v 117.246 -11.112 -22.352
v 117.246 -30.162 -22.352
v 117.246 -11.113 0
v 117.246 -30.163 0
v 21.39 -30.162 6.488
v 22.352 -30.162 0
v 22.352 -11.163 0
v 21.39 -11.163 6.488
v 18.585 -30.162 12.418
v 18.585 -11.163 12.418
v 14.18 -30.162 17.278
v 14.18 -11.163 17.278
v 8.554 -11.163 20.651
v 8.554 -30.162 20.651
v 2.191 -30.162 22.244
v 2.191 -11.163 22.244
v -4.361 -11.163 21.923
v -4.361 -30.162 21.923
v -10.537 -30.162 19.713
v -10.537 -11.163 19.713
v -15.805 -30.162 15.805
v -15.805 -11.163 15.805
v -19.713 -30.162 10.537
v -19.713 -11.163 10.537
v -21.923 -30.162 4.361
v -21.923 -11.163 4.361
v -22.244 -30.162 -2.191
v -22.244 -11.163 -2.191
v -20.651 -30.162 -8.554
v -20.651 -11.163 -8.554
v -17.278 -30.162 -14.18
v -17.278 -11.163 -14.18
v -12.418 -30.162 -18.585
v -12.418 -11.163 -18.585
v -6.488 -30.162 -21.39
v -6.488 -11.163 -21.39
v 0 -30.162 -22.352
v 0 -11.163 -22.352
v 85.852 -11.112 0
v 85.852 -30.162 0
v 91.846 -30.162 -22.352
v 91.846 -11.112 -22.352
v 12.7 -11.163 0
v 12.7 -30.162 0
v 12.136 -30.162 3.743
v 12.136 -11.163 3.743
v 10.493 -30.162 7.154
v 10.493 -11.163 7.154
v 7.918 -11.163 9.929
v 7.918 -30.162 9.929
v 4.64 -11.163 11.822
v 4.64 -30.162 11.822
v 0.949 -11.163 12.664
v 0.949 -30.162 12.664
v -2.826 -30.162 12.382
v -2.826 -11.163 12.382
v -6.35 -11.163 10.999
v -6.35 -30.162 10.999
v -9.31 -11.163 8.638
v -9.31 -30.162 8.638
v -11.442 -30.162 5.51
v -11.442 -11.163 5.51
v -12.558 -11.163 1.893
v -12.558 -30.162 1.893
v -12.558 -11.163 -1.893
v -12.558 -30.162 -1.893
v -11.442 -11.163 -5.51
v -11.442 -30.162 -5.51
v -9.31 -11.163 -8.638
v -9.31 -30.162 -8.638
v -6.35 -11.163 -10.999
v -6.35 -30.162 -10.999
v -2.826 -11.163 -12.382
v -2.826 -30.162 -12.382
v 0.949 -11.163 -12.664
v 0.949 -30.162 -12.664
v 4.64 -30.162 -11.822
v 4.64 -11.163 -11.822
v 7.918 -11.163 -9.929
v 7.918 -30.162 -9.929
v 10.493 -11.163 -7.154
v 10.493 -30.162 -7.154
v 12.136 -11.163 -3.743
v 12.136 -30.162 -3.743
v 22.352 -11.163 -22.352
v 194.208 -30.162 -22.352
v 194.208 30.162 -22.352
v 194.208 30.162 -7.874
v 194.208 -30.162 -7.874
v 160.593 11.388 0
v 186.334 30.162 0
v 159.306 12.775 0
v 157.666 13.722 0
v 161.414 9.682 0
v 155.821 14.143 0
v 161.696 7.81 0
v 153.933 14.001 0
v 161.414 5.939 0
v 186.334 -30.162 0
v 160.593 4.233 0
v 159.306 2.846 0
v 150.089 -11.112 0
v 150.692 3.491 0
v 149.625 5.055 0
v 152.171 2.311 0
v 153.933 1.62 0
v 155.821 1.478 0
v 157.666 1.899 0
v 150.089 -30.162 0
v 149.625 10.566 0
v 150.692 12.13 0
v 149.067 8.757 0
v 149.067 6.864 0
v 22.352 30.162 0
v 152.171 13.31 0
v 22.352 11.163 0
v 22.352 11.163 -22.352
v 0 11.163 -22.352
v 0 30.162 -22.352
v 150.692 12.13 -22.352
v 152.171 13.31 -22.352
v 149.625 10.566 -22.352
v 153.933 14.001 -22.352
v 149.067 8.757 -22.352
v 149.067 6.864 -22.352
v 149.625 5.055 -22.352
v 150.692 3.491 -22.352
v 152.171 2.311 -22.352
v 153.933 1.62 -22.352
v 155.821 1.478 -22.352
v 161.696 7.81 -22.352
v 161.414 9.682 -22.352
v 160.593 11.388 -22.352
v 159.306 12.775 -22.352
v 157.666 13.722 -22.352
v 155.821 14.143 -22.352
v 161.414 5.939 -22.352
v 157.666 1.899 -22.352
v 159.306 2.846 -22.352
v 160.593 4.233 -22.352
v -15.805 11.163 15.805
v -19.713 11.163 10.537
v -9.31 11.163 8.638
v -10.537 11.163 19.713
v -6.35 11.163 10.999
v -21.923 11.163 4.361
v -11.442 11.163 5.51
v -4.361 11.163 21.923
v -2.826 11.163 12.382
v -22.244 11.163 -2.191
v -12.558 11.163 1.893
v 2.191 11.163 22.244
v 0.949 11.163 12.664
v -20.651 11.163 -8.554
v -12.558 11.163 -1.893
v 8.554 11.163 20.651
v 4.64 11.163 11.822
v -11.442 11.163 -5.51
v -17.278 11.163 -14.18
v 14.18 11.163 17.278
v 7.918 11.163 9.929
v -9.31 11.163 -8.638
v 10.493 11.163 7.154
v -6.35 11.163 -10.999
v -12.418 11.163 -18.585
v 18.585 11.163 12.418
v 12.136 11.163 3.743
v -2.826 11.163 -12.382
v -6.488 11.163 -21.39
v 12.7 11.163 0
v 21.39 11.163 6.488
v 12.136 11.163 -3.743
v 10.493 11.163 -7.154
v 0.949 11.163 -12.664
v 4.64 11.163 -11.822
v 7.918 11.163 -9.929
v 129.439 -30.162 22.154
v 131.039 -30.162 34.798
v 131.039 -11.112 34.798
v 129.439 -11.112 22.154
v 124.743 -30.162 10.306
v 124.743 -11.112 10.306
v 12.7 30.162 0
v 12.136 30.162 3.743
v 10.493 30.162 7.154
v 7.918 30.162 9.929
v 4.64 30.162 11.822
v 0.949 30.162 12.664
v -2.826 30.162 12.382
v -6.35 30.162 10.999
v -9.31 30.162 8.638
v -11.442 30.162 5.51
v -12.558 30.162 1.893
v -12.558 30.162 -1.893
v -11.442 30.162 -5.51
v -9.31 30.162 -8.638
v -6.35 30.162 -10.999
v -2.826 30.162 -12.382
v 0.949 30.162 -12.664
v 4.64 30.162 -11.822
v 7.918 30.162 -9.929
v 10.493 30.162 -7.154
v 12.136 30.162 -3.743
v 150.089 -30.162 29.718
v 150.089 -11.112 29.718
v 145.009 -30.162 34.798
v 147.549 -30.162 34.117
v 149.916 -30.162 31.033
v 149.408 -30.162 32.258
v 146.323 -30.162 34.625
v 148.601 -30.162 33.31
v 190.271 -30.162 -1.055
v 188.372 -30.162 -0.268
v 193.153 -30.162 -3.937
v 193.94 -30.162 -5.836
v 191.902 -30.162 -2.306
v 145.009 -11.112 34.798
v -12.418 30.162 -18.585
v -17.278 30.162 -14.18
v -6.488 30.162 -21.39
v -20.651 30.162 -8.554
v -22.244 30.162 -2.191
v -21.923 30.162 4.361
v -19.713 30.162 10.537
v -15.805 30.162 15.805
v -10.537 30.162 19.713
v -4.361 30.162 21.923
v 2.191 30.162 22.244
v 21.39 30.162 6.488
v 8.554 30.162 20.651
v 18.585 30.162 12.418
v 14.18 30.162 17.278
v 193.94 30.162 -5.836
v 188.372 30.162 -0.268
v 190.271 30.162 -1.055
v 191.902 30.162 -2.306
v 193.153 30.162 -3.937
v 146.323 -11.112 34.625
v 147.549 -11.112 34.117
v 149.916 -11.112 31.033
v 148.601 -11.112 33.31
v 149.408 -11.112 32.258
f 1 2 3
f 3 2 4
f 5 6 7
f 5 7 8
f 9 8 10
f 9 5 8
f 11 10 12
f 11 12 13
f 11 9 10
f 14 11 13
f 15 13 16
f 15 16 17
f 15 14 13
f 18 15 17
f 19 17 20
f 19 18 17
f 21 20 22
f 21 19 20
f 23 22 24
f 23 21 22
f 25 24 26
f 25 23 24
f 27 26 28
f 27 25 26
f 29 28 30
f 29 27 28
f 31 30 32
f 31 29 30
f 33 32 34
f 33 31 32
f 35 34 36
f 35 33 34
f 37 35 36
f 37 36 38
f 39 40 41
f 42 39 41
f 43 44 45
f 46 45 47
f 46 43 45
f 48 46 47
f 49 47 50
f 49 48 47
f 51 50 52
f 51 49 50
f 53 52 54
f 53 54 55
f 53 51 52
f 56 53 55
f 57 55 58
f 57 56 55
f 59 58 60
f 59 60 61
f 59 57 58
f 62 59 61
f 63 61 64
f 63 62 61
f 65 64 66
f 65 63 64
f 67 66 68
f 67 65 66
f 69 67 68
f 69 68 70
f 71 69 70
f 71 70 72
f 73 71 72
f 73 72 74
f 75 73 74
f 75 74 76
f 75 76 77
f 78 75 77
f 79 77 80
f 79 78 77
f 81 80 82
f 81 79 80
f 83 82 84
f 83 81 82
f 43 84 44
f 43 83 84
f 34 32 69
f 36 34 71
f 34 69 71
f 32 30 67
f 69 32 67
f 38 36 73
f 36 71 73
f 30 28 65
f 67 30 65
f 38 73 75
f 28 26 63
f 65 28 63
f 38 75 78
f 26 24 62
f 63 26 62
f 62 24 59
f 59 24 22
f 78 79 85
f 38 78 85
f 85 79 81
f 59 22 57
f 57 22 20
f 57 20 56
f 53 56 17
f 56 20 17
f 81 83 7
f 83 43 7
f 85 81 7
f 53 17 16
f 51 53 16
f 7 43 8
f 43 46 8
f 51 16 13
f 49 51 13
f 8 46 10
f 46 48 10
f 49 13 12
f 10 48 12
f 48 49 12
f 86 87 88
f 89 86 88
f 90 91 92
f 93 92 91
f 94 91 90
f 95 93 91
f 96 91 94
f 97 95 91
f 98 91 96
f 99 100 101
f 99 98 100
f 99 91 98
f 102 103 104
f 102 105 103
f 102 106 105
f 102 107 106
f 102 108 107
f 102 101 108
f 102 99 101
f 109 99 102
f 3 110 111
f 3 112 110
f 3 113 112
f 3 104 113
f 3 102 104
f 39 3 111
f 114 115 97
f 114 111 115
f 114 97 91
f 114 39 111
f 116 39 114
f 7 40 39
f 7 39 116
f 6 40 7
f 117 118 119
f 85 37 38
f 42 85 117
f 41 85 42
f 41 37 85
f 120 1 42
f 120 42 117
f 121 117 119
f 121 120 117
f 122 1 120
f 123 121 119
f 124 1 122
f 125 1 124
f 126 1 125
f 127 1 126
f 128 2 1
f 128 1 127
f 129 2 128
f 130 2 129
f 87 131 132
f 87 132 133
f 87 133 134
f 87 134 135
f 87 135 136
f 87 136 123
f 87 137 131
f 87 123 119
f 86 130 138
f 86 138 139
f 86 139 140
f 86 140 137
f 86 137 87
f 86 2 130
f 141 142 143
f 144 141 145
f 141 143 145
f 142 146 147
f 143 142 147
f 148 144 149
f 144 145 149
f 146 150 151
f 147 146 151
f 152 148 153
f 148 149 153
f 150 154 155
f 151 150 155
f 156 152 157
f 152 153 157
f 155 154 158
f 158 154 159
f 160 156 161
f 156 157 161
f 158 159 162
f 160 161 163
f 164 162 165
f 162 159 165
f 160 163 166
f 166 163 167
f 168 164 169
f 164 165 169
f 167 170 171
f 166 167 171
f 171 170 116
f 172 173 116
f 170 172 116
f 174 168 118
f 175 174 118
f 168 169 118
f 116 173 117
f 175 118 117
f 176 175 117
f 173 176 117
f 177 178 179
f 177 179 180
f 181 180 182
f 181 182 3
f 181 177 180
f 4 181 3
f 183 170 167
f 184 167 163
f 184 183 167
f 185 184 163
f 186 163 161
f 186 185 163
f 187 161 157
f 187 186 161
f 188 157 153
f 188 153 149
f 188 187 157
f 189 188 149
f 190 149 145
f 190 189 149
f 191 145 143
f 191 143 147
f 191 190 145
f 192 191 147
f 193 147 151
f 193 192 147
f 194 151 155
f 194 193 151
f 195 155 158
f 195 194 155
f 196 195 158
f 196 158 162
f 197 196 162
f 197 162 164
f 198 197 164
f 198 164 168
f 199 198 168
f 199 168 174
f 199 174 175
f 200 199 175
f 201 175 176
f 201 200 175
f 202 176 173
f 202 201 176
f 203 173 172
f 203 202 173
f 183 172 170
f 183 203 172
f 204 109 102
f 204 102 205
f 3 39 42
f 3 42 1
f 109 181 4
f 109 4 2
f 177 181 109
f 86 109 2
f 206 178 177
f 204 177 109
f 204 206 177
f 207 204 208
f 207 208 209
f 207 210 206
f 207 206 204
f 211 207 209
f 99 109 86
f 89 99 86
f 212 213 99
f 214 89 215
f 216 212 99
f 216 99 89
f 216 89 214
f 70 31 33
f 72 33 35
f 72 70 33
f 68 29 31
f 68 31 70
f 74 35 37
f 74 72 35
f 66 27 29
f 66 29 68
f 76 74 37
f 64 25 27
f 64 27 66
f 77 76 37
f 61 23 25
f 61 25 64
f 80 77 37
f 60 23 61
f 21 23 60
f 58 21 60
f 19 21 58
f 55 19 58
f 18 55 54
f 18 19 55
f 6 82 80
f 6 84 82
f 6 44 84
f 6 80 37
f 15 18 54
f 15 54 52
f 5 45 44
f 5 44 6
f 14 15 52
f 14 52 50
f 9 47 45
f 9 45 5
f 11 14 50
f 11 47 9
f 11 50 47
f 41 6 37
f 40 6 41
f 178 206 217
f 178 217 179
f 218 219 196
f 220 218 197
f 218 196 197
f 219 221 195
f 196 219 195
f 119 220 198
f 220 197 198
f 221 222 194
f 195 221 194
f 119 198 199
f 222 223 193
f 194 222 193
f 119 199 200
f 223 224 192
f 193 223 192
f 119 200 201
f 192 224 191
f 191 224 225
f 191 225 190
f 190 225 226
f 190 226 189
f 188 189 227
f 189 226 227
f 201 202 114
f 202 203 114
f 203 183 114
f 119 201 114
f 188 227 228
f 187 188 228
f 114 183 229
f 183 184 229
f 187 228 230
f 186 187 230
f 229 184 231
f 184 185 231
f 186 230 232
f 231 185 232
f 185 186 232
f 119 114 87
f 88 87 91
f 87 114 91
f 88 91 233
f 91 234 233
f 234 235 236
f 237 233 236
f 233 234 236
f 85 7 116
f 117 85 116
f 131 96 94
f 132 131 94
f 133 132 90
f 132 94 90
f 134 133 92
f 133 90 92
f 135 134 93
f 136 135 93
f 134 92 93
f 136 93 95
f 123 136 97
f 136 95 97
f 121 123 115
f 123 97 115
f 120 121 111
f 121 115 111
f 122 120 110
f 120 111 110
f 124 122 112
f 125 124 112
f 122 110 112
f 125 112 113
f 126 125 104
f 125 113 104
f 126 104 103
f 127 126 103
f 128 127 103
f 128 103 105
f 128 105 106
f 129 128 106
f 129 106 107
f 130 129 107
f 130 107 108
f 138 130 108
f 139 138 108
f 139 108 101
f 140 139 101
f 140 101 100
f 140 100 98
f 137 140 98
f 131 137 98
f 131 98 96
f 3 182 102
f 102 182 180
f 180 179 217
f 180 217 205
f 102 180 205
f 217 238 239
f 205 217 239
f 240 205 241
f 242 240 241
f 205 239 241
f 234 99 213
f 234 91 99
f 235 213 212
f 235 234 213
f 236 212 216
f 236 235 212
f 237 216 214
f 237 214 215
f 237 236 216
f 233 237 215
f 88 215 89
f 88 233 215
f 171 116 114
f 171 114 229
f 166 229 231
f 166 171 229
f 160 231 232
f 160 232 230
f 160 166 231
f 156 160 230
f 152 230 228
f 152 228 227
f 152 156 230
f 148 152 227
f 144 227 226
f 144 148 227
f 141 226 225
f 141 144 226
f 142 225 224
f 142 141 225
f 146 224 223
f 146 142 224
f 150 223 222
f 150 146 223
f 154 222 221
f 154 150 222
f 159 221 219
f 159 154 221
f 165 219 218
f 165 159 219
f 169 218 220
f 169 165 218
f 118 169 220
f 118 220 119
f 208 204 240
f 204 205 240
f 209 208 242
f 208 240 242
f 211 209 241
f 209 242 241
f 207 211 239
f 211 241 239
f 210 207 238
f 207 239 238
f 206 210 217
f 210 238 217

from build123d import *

# Parameters (mm, degrees)
F0_R          = 12.7
F1_DEPTH      = 30.1625
F2_W          = 44.8737880948
F2_H          = 22.3266
F3_DEPTH      = 22.353
F3_DEPTH_BACK = 22.353
F5_DEPTH      = 19.05
F7_DEPTH      = 19.05
F8_R          = 6.35
F9_DEPTH      = 22.353
F10_R         = 7.874
F11_R         = 5.08


with BuildPart() as f1:
    # F0 (on Front) → F1 (new body, symmetric)
    with BuildSketch(Plane.XZ):
        with BuildLine():
            Line((194.2084, 0), (22.352, 0))
            ThreePointArc((22.352, 0), (-15.8052507731, 15.8052507731), (0, -22.352))
            Line((0, -22.352), (194.2084, -22.352))
            Line((194.2084, -22.352), (194.2084, 0))
        make_face()
        Circle(F0_R, mode=Mode.SUBTRACT)
    extrude(amount=F1_DEPTH, both=True)

    # F2 (on face) → F3 (cut, two sides)
    with BuildSketch(Plane.XY) as f3_sk:
        with Locations((-0.0848940474, 0)):
            Rectangle(F2_W, F2_H)
    extrude(amount=-F3_DEPTH, mode=Mode.SUBTRACT)
    extrude(f3_sk.sketch, amount=F3_DEPTH_BACK, mode=Mode.SUBTRACT)

    # F4 (on face) → F5 (cut)
    with BuildSketch(Plane.XZ.offset(30.1625)):
        Polygon((117.2464, 0), (85.852, 0), (91.8464, -22.352), (117.2464, -22.352), align=None)
    extrude(amount=-F5_DEPTH, mode=Mode.SUBTRACT)

    # F6 (on face) → F7 (join)
    with BuildSketch(Plane.XZ.offset(30.1625)):
        with BuildLine():
            Line((150.0886, 34.798), (131.0386, 34.798))
            ThreePointArc((131.0386, 34.798), (127.4644153616, 16.0823576341), (117.2464, 0))
            Line((117.2464, 0), (150.0886, 0))
            Line((150.0886, 0), (150.0886, 34.798))
        make_face()
    extrude(amount=-F7_DEPTH)

    # F8 (on face) → F9 (cut, through all)
    with BuildSketch(Plane.XY):
        with Locations((155.3464, 7.8105)):
            Circle(F8_R)
    extrude(amount=-F9_DEPTH, mode=Mode.SUBTRACT)

    # F10
    f10_edges = [f1.edges().sort_by_distance(p)[0] for p in [
        (194.2084, 0, 0),
    ]]
    fillet(f10_edges, radius=F10_R)

    # F11
    f11_edges = [f1.edges().sort_by_distance(p)[0] for p in [
        (150.0886, -20.6375, 34.798),
    ]]
    fillet(f11_edges, radius=F11_R)


solid = f1.part
